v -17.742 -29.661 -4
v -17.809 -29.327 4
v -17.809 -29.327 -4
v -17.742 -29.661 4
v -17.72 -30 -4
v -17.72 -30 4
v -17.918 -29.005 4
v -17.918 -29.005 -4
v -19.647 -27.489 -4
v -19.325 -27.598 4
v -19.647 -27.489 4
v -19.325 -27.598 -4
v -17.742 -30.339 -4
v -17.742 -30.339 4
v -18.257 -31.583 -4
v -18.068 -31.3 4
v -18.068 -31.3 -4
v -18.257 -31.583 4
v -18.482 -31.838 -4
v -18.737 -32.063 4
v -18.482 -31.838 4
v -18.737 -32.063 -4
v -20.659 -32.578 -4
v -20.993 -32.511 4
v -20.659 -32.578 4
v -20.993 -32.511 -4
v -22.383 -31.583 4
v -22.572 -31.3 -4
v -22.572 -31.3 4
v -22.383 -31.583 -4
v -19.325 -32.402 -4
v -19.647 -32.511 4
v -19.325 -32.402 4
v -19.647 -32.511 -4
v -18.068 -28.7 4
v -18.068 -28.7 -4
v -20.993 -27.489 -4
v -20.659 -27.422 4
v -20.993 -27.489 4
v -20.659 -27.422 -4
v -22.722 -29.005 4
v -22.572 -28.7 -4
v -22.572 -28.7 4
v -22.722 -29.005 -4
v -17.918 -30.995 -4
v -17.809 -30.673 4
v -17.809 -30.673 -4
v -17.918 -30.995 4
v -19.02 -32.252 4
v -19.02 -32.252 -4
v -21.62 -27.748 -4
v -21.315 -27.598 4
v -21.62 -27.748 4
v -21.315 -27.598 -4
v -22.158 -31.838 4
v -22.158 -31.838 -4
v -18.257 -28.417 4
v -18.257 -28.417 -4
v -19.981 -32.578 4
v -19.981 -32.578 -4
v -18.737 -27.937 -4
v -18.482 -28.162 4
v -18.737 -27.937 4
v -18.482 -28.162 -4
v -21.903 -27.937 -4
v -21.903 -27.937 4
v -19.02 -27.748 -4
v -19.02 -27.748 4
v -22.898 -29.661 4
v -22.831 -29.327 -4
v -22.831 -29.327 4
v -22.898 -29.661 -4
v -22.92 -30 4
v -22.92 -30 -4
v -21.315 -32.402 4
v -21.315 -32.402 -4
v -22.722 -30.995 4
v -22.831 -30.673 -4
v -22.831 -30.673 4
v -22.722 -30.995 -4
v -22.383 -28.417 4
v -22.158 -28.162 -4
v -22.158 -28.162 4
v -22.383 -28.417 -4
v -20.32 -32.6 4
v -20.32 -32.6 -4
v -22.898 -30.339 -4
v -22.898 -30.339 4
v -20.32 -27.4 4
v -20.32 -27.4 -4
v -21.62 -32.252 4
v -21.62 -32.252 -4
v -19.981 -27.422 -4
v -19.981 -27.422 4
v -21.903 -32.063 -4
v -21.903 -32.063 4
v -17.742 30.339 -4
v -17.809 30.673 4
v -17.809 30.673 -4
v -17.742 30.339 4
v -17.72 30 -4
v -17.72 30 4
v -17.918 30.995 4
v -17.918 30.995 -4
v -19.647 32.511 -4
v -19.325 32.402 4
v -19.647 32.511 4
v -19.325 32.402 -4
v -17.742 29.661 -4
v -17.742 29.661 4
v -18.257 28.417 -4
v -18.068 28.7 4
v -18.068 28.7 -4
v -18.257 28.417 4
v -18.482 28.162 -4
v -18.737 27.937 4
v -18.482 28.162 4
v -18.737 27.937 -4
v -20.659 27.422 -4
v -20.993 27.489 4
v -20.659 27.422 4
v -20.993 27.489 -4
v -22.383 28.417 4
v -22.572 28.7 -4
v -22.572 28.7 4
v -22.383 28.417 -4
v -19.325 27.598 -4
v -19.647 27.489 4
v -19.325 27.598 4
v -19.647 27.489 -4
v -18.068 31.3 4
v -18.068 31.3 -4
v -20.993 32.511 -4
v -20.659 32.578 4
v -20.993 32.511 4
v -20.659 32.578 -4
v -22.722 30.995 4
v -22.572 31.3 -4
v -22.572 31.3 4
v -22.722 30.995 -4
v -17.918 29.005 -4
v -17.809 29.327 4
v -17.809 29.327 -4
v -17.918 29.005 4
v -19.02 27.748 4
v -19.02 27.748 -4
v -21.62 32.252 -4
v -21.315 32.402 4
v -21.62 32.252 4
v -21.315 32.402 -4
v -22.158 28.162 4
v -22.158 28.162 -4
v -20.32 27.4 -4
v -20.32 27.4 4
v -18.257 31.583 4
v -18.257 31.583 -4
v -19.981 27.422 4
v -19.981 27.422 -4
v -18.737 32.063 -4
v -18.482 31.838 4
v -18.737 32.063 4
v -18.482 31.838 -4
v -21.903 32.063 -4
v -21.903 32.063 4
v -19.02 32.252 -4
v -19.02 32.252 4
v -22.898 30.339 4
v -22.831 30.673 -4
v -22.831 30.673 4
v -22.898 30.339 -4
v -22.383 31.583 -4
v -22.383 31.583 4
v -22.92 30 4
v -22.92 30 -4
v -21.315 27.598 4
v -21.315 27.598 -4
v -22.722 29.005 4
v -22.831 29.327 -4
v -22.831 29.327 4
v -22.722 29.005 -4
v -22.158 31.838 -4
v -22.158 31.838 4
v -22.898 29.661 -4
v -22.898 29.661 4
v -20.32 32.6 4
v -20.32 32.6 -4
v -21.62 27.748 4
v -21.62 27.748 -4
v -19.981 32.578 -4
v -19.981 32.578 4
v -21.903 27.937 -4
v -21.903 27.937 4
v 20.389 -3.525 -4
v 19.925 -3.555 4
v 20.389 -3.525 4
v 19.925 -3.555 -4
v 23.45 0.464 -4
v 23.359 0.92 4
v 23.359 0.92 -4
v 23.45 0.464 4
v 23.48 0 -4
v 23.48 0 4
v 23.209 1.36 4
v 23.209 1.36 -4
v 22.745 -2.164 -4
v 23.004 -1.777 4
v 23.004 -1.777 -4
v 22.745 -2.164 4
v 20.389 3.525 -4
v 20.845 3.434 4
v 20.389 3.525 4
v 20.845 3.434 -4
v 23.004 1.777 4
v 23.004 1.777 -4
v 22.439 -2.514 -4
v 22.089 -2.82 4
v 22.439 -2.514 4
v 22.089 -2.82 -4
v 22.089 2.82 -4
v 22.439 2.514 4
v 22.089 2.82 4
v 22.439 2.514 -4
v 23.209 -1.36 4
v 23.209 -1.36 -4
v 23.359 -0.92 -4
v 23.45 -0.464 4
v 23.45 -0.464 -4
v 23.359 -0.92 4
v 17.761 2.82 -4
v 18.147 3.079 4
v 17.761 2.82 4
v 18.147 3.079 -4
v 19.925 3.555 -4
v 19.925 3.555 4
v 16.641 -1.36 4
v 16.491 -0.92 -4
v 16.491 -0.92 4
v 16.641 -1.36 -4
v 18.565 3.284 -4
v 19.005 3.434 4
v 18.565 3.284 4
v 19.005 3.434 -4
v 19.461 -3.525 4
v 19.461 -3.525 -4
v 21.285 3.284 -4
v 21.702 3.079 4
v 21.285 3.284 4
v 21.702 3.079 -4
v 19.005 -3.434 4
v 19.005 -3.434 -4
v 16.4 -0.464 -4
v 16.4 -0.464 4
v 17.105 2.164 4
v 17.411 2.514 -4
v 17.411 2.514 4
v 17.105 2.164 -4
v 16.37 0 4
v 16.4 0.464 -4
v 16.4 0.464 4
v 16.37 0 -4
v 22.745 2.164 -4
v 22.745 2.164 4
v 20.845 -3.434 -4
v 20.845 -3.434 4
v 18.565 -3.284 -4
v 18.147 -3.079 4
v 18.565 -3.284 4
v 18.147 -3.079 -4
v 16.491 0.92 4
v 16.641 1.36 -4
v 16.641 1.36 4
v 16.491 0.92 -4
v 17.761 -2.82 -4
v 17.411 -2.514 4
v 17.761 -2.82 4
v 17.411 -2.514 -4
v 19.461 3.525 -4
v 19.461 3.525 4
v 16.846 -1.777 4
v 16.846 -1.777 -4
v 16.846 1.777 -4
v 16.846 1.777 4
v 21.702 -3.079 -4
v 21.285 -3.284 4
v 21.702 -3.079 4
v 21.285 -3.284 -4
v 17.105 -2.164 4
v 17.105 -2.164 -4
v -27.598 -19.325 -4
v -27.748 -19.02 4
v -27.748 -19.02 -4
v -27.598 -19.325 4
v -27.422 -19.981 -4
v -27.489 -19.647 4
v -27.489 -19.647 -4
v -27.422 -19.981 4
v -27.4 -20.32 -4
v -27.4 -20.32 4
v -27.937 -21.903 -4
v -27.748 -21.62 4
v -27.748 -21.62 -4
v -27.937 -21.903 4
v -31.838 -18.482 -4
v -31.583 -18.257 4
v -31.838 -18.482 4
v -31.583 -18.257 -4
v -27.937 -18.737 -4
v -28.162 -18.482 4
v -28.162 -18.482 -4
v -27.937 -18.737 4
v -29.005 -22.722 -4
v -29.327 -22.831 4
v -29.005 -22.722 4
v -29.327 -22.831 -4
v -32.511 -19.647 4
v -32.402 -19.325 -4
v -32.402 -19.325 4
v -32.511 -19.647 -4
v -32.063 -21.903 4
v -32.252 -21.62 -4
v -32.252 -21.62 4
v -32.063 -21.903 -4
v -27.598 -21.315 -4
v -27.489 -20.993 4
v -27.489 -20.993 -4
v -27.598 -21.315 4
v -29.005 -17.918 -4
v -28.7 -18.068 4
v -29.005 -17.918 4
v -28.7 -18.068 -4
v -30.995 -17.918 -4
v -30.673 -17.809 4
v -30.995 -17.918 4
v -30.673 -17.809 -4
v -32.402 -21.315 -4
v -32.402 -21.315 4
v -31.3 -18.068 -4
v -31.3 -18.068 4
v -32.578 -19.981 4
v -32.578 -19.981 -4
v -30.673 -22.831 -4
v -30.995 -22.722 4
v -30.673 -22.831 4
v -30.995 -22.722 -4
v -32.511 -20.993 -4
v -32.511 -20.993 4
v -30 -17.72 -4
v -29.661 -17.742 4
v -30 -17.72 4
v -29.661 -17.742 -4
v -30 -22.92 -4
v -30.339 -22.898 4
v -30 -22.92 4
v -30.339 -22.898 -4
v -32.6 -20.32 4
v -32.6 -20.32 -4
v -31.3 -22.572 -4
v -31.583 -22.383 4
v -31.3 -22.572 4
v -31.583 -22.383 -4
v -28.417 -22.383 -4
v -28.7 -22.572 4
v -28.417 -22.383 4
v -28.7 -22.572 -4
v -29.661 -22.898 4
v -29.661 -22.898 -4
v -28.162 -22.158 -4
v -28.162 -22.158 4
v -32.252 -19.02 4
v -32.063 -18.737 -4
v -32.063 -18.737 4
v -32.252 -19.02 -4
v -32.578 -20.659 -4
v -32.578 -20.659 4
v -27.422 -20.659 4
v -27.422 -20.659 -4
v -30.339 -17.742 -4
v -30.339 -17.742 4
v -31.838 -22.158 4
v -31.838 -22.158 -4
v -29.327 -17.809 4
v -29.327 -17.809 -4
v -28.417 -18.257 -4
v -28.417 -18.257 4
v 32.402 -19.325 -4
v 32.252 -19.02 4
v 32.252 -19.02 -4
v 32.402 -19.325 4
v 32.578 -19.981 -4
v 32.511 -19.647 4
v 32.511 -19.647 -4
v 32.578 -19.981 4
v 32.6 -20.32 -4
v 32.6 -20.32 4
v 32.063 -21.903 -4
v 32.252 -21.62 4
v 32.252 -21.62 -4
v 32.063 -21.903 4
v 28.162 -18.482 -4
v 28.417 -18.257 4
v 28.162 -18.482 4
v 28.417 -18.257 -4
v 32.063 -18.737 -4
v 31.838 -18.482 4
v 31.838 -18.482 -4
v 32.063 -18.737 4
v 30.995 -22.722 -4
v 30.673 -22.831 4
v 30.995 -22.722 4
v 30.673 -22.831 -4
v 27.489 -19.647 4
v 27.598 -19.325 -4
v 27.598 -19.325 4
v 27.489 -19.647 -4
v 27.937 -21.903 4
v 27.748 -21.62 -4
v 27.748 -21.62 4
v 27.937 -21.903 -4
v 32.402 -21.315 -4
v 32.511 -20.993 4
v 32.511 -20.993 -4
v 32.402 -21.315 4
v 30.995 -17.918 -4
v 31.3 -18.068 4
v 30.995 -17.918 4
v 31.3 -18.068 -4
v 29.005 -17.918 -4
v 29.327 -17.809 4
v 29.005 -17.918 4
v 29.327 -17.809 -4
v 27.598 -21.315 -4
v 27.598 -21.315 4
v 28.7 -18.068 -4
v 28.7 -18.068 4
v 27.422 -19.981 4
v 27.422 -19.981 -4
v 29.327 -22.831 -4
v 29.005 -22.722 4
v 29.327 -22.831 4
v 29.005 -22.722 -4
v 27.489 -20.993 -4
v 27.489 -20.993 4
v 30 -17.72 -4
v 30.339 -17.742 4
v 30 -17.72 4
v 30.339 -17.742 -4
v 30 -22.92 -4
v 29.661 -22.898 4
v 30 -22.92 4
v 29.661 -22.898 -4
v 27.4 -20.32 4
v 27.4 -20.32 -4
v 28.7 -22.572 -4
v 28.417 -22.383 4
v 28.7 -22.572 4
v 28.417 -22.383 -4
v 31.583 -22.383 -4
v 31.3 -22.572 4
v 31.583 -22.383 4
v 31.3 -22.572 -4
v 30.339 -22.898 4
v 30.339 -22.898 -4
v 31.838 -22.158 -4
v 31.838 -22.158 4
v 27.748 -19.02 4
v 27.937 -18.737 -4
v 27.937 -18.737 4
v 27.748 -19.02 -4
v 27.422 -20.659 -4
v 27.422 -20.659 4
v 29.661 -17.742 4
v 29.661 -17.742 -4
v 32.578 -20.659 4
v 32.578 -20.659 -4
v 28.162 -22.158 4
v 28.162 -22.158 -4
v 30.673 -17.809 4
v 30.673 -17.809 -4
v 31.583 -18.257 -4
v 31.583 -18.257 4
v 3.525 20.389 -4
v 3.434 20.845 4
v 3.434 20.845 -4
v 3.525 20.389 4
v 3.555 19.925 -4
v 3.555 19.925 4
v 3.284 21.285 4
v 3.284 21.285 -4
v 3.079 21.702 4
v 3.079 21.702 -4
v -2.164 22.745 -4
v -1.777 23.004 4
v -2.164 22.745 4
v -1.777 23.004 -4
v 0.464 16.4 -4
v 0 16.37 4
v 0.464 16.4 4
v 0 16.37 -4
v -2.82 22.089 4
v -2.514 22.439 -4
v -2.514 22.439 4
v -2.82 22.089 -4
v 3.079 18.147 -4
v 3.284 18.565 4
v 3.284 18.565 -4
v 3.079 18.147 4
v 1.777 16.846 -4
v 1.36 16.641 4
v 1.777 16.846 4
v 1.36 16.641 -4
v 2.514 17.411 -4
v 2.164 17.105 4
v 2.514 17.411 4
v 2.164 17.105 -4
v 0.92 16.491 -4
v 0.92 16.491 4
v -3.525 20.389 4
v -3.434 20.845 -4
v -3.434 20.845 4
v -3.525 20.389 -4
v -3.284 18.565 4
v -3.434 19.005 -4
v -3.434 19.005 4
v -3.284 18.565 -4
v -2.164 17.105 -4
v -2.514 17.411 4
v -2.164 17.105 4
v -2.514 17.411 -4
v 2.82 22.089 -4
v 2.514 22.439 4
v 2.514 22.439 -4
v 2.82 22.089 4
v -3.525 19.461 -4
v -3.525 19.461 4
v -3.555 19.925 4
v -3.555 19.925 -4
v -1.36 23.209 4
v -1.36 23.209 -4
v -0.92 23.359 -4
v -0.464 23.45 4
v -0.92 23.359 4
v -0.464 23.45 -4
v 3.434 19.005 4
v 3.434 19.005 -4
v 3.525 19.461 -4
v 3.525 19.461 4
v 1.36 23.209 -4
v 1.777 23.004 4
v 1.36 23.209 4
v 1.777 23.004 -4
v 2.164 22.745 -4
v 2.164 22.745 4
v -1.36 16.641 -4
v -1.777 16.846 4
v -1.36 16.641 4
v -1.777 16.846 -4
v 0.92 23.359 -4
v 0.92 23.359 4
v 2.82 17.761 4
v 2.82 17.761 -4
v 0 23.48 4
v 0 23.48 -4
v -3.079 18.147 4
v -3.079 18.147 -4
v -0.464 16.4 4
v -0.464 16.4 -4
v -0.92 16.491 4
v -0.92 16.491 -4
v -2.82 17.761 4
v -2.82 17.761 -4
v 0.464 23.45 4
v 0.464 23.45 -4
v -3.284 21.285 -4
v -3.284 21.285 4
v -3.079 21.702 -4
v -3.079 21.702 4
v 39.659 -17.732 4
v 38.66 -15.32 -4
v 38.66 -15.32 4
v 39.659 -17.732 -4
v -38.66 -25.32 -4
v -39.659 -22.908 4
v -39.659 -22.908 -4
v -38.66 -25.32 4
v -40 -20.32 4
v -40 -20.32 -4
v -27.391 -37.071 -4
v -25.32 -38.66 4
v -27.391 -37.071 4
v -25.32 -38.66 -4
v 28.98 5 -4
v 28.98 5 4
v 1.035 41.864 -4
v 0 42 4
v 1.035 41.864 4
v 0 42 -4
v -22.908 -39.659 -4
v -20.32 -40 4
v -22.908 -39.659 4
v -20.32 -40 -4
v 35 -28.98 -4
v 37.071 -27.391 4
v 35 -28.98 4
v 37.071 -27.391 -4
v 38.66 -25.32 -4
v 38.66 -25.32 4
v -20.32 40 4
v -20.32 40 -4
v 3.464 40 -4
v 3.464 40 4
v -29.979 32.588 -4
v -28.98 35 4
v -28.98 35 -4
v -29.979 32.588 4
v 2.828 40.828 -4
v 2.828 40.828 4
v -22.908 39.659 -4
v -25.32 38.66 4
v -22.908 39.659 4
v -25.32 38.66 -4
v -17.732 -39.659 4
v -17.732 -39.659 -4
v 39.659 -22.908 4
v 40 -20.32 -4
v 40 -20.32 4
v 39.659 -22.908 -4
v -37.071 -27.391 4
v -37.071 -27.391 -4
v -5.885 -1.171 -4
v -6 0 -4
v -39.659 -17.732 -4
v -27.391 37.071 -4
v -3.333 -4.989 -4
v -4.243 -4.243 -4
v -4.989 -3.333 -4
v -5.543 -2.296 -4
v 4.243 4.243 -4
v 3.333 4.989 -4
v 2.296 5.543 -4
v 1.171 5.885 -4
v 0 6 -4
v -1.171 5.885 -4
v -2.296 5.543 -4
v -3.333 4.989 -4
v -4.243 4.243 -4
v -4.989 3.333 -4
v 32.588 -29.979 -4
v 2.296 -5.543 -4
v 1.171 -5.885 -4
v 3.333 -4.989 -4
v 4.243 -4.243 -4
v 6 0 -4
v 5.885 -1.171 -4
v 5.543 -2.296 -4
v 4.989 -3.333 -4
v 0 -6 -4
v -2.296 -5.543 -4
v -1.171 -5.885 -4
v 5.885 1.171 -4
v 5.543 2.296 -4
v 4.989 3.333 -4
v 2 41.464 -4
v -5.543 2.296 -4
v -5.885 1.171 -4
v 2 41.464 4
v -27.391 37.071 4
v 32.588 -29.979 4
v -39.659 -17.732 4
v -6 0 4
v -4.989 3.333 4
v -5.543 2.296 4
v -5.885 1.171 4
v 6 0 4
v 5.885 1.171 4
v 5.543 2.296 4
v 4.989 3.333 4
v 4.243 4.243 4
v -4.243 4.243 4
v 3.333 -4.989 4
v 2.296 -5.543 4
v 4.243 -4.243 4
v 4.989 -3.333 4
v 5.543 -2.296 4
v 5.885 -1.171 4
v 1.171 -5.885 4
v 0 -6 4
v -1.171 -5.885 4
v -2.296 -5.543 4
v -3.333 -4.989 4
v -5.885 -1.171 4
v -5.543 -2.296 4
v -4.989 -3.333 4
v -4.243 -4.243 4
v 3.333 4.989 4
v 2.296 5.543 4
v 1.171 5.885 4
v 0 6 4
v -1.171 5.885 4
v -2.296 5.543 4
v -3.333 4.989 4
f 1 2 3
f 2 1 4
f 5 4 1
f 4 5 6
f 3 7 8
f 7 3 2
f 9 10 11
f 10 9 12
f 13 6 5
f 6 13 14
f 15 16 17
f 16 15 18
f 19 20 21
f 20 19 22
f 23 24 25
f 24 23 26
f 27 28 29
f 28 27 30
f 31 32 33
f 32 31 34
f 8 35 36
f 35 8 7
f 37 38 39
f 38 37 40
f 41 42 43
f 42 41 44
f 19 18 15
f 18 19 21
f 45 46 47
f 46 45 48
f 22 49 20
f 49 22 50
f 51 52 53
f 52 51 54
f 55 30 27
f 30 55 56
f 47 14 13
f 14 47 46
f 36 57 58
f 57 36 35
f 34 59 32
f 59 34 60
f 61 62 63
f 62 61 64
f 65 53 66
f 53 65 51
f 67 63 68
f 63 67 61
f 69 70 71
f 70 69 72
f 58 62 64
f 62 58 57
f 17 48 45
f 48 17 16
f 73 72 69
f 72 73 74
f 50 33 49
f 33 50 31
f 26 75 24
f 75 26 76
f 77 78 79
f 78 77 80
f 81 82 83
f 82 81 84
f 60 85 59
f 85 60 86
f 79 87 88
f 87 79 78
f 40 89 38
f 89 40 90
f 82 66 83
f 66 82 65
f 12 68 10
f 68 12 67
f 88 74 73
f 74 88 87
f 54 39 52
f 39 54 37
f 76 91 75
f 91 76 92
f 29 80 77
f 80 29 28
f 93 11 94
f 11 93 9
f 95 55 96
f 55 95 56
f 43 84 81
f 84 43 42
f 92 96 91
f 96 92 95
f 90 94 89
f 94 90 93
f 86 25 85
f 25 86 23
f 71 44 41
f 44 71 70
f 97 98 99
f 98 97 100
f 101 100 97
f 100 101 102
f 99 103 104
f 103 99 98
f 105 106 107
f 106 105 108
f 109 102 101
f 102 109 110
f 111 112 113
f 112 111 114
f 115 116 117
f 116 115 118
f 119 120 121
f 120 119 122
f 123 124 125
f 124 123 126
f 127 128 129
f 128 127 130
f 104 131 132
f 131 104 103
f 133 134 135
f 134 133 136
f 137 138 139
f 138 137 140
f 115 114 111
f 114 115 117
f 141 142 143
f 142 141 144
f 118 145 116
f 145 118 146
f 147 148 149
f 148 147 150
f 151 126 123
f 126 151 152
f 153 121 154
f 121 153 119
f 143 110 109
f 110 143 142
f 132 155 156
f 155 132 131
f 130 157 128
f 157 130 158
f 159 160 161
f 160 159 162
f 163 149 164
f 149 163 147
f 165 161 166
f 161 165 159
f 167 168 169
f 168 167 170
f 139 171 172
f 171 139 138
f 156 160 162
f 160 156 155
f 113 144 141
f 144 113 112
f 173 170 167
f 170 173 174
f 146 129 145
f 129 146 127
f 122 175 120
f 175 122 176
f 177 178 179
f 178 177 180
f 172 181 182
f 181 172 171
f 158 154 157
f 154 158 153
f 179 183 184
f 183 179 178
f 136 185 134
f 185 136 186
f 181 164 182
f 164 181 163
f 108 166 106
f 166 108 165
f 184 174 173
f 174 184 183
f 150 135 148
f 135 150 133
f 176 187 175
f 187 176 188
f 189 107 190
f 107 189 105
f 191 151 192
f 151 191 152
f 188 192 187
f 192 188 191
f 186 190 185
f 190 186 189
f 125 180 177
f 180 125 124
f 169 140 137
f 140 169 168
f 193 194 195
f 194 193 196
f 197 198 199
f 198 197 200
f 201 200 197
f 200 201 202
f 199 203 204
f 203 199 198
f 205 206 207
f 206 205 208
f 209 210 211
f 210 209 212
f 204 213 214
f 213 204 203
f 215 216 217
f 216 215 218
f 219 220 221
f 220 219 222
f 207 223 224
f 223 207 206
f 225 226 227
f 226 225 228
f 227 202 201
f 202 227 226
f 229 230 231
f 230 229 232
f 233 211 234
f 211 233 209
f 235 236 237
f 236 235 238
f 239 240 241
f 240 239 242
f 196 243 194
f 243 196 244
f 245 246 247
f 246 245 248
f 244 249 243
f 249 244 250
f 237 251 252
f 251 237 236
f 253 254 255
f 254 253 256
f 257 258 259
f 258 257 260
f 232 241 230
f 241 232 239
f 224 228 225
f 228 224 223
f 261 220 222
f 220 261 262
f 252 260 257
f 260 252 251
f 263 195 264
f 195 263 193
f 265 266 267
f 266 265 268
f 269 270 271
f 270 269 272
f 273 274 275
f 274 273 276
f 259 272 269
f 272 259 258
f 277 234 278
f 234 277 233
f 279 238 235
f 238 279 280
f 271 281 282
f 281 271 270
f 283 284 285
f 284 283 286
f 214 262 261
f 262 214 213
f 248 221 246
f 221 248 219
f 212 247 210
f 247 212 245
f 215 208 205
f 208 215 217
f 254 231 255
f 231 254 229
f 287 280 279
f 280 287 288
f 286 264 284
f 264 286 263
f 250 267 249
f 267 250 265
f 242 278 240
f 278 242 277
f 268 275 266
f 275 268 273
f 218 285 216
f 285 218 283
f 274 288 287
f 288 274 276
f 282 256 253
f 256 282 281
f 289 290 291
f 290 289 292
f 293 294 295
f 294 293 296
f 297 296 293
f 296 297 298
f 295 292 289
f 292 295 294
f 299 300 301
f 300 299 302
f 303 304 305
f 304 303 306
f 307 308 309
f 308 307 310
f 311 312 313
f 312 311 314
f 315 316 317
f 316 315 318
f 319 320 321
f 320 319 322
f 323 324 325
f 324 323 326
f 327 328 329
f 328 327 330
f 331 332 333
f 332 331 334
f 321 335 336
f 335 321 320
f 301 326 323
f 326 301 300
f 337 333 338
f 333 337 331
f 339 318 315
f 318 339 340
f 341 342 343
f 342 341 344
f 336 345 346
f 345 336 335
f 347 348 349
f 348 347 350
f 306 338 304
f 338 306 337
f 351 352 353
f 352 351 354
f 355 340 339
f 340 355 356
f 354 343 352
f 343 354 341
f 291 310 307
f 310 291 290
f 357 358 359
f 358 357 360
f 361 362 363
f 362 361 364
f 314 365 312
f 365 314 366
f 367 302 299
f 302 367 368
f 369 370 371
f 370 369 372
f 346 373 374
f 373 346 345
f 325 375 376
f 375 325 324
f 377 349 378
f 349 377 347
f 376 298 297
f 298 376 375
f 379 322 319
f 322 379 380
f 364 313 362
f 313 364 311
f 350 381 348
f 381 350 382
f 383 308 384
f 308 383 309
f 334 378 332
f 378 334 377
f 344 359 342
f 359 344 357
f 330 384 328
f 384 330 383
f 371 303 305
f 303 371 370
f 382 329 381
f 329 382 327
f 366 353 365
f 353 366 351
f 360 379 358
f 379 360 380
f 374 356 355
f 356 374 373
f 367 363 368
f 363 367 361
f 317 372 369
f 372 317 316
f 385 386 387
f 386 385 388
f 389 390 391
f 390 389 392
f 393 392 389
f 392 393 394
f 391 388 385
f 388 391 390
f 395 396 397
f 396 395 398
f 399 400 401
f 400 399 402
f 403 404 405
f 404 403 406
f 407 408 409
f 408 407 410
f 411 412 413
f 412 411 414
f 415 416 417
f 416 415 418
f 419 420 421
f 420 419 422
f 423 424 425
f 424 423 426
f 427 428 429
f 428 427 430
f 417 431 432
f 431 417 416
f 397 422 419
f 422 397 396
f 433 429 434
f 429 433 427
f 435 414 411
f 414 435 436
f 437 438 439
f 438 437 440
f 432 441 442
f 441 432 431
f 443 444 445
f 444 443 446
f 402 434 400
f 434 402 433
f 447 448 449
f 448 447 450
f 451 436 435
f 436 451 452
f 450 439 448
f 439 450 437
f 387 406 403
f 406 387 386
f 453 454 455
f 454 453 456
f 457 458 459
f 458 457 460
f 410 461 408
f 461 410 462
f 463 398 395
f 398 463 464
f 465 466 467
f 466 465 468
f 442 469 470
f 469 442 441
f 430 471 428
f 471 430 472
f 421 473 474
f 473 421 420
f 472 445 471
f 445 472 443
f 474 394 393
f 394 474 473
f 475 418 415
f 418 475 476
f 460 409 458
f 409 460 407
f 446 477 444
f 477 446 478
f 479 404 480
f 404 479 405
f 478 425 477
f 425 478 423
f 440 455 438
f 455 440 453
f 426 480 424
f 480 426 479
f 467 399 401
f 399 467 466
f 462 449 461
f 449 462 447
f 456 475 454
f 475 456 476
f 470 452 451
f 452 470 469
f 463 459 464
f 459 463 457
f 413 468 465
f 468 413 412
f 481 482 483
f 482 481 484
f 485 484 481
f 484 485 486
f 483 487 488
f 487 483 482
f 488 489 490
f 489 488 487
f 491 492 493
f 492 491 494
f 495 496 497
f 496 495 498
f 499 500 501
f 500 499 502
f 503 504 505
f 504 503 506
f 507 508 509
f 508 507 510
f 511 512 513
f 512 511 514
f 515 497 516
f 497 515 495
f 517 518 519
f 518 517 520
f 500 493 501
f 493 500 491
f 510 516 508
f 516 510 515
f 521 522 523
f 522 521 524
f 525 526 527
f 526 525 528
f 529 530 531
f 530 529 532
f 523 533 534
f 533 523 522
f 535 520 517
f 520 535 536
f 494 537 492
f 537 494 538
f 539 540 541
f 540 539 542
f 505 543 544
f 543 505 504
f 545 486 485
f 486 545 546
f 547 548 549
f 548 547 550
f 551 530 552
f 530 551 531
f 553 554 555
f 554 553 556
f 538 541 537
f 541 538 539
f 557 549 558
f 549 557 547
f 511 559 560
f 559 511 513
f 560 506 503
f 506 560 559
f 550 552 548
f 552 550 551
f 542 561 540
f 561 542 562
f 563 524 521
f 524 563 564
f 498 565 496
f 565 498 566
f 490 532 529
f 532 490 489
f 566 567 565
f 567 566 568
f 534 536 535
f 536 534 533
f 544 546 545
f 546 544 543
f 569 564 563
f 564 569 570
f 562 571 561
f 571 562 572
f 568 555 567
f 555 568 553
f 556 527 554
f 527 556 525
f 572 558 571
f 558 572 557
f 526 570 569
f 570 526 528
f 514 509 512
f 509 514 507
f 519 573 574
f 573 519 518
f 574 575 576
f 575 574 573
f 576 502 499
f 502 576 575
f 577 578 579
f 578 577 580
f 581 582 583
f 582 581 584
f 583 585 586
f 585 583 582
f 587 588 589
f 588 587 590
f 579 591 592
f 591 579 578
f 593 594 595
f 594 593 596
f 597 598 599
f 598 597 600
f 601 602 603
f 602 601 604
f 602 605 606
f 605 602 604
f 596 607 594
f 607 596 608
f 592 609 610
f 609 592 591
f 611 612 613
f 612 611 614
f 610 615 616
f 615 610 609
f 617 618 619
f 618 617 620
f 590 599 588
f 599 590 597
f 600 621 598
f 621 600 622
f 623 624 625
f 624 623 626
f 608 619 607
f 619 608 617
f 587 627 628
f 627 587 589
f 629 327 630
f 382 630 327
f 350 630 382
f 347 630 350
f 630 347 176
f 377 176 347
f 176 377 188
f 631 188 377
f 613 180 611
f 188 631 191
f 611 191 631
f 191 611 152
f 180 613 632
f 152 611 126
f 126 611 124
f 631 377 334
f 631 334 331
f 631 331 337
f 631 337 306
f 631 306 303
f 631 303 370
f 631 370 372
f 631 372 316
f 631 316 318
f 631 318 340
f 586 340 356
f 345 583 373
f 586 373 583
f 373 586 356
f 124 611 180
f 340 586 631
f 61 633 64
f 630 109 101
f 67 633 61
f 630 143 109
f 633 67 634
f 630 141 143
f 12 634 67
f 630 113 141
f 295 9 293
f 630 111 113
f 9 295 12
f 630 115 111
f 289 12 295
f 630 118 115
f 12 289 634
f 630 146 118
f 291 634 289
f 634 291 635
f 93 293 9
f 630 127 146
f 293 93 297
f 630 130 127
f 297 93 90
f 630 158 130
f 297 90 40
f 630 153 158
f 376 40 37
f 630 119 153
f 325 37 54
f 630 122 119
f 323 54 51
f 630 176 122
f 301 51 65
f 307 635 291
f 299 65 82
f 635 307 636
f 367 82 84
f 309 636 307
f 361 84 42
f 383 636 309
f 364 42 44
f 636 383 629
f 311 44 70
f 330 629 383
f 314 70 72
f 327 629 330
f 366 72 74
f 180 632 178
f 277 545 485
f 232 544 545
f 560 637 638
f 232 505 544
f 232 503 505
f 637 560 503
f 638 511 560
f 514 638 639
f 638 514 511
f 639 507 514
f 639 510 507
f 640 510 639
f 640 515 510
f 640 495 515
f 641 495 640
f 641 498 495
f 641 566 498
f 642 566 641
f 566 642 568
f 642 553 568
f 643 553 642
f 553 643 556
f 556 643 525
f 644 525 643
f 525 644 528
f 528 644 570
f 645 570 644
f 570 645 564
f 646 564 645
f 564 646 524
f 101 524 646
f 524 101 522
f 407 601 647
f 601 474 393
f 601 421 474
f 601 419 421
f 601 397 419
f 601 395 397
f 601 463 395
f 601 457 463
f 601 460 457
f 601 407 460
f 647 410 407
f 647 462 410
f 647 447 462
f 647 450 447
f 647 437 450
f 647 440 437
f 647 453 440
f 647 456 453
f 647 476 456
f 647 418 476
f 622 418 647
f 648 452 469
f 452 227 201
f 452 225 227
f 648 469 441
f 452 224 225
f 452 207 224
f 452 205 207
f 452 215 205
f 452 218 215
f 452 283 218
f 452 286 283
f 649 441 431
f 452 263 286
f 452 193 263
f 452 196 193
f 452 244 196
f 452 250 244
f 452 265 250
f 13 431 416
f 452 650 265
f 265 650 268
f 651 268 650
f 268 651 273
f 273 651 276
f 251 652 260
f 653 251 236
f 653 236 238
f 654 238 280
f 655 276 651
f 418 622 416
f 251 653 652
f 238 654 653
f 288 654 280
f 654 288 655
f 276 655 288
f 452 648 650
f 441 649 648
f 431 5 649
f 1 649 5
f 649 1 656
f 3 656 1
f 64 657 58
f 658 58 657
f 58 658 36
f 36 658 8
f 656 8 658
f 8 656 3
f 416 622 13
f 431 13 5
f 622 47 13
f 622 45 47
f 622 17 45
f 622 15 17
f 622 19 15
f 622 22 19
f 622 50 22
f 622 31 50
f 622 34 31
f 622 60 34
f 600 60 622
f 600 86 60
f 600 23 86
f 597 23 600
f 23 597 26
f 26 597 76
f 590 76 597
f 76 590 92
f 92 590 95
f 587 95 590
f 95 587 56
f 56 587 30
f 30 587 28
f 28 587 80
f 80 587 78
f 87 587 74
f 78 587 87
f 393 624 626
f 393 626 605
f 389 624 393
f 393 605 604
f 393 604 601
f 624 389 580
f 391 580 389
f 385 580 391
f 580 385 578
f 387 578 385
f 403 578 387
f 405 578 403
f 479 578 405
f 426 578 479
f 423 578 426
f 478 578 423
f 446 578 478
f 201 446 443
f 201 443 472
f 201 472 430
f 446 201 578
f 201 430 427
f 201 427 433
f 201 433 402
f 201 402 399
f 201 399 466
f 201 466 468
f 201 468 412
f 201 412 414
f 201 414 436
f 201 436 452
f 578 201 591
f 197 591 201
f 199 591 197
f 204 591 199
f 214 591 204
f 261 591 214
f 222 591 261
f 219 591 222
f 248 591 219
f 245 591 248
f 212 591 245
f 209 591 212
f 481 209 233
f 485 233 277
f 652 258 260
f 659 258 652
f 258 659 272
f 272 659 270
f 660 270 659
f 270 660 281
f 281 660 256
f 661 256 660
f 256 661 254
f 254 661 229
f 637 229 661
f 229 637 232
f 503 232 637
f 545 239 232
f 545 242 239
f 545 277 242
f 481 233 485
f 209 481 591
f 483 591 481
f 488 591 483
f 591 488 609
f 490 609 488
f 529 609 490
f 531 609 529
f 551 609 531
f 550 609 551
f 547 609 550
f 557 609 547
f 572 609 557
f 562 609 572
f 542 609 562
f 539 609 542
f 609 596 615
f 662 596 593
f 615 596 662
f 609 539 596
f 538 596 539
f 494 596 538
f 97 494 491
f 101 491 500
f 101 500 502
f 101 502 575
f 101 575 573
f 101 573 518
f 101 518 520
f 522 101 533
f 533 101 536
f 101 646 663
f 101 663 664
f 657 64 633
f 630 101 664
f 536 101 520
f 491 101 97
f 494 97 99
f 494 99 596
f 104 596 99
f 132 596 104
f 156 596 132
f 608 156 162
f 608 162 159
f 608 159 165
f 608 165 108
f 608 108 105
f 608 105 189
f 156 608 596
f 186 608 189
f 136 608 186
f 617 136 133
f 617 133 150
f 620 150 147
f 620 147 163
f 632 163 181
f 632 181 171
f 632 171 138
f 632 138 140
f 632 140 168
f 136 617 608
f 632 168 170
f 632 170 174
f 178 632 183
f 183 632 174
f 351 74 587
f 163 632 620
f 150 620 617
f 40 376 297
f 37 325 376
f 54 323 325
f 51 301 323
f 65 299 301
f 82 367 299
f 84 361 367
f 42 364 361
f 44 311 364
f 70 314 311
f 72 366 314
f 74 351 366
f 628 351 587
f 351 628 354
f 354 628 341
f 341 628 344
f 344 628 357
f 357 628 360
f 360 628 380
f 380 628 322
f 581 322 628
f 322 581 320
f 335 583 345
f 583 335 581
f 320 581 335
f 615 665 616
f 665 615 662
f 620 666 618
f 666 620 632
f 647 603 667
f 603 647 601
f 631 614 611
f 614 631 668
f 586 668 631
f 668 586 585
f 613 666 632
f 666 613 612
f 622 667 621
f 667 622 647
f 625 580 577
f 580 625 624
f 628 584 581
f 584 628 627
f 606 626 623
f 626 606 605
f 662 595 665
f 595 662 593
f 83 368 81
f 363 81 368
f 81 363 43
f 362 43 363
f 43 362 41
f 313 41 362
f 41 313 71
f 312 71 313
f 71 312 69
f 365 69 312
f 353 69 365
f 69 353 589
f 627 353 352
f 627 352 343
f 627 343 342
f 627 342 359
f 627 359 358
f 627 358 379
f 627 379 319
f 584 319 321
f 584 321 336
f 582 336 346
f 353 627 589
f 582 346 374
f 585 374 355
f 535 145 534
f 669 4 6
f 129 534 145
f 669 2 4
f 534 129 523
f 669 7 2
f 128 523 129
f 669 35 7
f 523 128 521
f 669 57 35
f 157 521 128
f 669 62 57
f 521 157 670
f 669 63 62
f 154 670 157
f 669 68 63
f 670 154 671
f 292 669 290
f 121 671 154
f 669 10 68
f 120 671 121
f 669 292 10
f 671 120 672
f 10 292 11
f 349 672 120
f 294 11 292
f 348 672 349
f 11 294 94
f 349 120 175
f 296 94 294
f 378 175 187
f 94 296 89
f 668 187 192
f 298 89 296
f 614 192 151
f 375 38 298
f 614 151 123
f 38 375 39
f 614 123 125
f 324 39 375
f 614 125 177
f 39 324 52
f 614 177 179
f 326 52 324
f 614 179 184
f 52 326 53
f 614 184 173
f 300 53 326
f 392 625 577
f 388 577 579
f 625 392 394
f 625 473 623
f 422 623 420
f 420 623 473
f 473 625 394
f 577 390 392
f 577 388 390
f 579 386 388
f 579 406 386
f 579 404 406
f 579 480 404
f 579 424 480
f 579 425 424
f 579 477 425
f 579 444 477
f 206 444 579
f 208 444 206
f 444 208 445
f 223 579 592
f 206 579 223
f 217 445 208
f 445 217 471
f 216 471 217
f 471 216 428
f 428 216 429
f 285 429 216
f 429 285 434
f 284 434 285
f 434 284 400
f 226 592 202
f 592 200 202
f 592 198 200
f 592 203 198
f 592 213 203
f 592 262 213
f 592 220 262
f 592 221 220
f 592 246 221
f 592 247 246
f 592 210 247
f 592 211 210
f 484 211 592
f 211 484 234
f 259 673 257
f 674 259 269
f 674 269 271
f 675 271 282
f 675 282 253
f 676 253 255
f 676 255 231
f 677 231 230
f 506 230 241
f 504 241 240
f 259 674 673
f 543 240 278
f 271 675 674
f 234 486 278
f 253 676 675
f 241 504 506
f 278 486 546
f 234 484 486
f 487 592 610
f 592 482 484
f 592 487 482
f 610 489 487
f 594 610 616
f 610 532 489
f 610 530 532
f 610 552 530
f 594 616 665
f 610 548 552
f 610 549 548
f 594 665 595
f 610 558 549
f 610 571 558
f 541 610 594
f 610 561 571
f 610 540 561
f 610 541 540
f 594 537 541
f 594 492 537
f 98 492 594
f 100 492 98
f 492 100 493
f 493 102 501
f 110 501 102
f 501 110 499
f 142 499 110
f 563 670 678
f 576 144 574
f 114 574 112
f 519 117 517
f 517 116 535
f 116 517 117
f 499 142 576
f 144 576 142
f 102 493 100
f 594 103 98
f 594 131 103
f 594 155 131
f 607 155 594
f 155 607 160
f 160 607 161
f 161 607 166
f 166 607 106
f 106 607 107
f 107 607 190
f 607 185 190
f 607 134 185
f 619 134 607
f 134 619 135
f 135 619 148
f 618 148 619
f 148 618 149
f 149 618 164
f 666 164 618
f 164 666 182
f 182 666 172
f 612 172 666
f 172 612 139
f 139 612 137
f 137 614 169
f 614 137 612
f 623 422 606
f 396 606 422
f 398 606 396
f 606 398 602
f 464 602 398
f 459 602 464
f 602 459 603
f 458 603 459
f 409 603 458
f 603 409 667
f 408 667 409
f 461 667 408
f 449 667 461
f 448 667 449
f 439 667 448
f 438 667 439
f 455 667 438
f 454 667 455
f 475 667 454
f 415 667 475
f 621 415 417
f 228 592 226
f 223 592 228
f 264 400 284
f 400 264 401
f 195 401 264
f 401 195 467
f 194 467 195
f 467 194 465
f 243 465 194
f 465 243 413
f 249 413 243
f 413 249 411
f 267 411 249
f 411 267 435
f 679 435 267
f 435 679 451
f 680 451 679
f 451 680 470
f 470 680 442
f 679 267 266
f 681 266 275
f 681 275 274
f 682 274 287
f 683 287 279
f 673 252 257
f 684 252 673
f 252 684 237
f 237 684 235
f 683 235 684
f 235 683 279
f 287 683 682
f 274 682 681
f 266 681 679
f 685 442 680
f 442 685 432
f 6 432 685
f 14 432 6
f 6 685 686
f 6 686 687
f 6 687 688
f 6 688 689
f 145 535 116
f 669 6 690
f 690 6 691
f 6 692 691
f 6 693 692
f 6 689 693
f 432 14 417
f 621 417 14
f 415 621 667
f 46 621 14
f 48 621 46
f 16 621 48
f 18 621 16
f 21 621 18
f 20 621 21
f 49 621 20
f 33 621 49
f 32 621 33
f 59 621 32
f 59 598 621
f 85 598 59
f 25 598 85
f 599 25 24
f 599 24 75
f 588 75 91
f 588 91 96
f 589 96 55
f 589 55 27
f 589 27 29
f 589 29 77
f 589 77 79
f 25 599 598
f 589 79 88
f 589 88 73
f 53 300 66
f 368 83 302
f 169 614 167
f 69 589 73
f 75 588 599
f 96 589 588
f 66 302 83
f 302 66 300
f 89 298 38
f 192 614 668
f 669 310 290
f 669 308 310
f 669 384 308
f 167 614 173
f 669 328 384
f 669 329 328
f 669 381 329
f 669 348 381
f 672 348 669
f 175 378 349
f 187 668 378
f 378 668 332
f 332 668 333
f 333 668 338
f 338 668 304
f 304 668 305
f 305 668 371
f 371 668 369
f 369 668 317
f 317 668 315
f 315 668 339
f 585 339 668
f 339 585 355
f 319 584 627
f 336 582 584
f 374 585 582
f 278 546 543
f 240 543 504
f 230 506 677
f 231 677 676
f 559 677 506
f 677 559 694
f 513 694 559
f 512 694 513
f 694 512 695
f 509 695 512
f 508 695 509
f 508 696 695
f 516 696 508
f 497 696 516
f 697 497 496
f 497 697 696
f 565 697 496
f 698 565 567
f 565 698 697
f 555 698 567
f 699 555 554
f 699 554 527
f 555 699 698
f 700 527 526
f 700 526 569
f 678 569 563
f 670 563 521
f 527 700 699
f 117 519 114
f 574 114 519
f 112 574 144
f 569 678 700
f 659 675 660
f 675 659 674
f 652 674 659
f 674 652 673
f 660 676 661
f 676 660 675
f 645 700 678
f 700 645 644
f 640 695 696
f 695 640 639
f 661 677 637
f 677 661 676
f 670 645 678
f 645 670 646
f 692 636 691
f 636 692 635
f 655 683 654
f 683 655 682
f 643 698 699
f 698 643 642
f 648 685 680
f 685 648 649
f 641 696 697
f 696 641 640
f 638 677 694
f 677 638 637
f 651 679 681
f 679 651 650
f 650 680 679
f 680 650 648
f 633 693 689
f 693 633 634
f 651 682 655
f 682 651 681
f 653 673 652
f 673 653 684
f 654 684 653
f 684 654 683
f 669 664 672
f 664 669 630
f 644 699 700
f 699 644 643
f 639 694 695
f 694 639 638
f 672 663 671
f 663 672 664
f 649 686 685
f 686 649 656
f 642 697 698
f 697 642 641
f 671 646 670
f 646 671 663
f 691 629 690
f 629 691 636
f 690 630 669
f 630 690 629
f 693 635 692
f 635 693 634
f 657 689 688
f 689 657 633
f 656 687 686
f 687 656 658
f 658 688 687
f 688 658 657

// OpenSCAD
// file: wheel-spacer.scad
// Nominal 6 mm spacer family, axis Z, wheel face at Z=0.
// Supplier: https://www.makerstore.com.au/product/shim-eccentric-8-6/
// 8 mm AF, 10 mm flange, 5 mm bore, 7.11 mm plate hole, ~0.79 travel.
// Flange/collar thicknesses and 7.08 pilot OD are provisional.
function spacer_eccentricity() = 0.79/2;
function spacer_plate_hole() = 7.11;
module wheel_spacer(eccentric=false,angle=0) {
    e=spacer_eccentricity();
    // Origin stays on the axle; the locating pilot is offset from it.
    rotate([0,0,angle]) difference() {
        if(eccentric) translate([-e,0,0]) union() {
            cylinder(h=5,d=8/cos(30),$fn=6);
            translate([0,0,5]) cylinder(h=1,d=10,$fn=48);
            translate([0,0,6]) cylinder(h=1.5,d=7.08,$fn=48);
        }
        else cylinder(h=6,d=8,$fn=48);
        translate([0,0,-0.1]) cylinder(h=8,d=5,$fn=48);
    }
}
color([0.65,0.69,0.72]) wheel_spacer(true);
// file: vslot-wheel.scad
// Solid V wheel reference: ../../datasheets/solid-v-wheel-drawing.jpg.
// Supplier: https://www.makerstore.com.au/product/wheel-solidv-kit/
// Axis Z, centred at origin. Nominal assembly, not manufacturing CAD.
show_bearings = true;

function vwheel_width() = 10.23; // kit spec; drawing rounds this to 10.20
function vwheel_od() = 23.90;
function vwheel_land() = 5.90;
// Derived tangent fit against the 9.16 mm mouth and 45-degree rail faces.
function vwheel_2020_offset() = 10-9.16/2 + vwheel_od()/2 + vwheel_land()/2;

module vslot_wheel(bearings=true, facets=64) {
    w=vwheel_width();
    r=vwheel_od()/2;
    land=vwheel_land();
    edge_r=r-(w-land)/2; // 45-degree mating chamfers
    color([0.12,0.14,0.16]) rotate_extrude($fn=facets,convexity=6)
        polygon([[8,-w/2],[edge_r,-w/2],[r,-land/2],
                 [r,land/2],[edge_r,w/2],[8,w/2],
                 [8,0.115],[7,0.115],[7,-0.115],[8,-0.115]]);
    // Two nominal 625 bearings: 5 mm bore, 16 mm OD, 5 mm wide.
    // Internal rolling elements omitted; centre shim holds inner races apart.
    if(bearings) {
        for(z=[-w/2,0.115]) translate([0,0,z]) {
            color([0.65,0.69,0.72]) difference() {
                cylinder(h=5,d=16,$fn=facets);
                translate([0,0,-0.01]) cylinder(h=5.02,d=5,$fn=facets);
            }
            for(face=[0,4.95]) color([0.18,0.20,0.22])
                translate([0,0,face]) difference() {
                    cylinder(h=0.05,d=13.5,$fn=facets);
                    translate([0,0,-0.01]) cylinder(h=0.07,d=7.5,$fn=facets);
                }
        }
        color([0.65,0.69,0.72]) difference() {
            cylinder(h=0.23,d=10,center=true,$fn=facets);
            cylinder(h=0.25,d=5,center=true,$fn=facets);
        }
    }
}

vslot_wheel(show_bearings);
// main file
// Compact six-wheel carriage; original geometry inspired by OTL footprint.
// XY plate, Z thickness. Z rail along Y on rear; X rail along X on front.
use <vslot-wheel.scad>
use <wheel-spacer.scad>
// Last point in each set is the intended eccentric adjuster.
function carriage_z_holes(spacing=60) =
    [[-vwheel_2020_offset(),-spacing/2],[-vwheel_2020_offset(),spacing/2],
     [vwheel_2020_offset(),0]];
function carriage_x_holes(spacing=60) =
    [[-spacing/2,-vwheel_2020_offset()],[spacing/2,-vwheel_2020_offset()],
     [0,vwheel_2020_offset()]];
module compact_carriage(size=84,thickness=8,spacing=60) {
    holes=concat(carriage_z_holes(spacing),carriage_x_holes(spacing));
    difference() {
        linear_extrude(height=thickness,center=true) hull() {
            for(p=holes) translate(p) circle(r=10,$fn=24);
            // Preserve the top line anchor.
            translate([0,size/2-4]) circle(r=4,$fn=24);
        }
        // Four concentric M5 holes; two larger eccentric locating holes.
        for(axis=[0,1],i=[0:2]) {
            p=axis==0 ? carriage_z_holes(spacing)[i] : carriage_x_holes(spacing)[i];
            shift=i==2 ? (axis==0 ? [-spacer_eccentricity(),0] : [0,-spacer_eccentricity()]) : [0,0];
            translate([p[0]+shift[0],p[1]+shift[1],0])
                cylinder(h=thickness+2,d=i==2 ? spacer_plate_hole() : 5.2,center=true,$fn=48);
        }
        cylinder(h=thickness+2,d=12,center=true,$fn=32);
    }
}
color([0.91,0.30,0.12]) compact_carriage();
